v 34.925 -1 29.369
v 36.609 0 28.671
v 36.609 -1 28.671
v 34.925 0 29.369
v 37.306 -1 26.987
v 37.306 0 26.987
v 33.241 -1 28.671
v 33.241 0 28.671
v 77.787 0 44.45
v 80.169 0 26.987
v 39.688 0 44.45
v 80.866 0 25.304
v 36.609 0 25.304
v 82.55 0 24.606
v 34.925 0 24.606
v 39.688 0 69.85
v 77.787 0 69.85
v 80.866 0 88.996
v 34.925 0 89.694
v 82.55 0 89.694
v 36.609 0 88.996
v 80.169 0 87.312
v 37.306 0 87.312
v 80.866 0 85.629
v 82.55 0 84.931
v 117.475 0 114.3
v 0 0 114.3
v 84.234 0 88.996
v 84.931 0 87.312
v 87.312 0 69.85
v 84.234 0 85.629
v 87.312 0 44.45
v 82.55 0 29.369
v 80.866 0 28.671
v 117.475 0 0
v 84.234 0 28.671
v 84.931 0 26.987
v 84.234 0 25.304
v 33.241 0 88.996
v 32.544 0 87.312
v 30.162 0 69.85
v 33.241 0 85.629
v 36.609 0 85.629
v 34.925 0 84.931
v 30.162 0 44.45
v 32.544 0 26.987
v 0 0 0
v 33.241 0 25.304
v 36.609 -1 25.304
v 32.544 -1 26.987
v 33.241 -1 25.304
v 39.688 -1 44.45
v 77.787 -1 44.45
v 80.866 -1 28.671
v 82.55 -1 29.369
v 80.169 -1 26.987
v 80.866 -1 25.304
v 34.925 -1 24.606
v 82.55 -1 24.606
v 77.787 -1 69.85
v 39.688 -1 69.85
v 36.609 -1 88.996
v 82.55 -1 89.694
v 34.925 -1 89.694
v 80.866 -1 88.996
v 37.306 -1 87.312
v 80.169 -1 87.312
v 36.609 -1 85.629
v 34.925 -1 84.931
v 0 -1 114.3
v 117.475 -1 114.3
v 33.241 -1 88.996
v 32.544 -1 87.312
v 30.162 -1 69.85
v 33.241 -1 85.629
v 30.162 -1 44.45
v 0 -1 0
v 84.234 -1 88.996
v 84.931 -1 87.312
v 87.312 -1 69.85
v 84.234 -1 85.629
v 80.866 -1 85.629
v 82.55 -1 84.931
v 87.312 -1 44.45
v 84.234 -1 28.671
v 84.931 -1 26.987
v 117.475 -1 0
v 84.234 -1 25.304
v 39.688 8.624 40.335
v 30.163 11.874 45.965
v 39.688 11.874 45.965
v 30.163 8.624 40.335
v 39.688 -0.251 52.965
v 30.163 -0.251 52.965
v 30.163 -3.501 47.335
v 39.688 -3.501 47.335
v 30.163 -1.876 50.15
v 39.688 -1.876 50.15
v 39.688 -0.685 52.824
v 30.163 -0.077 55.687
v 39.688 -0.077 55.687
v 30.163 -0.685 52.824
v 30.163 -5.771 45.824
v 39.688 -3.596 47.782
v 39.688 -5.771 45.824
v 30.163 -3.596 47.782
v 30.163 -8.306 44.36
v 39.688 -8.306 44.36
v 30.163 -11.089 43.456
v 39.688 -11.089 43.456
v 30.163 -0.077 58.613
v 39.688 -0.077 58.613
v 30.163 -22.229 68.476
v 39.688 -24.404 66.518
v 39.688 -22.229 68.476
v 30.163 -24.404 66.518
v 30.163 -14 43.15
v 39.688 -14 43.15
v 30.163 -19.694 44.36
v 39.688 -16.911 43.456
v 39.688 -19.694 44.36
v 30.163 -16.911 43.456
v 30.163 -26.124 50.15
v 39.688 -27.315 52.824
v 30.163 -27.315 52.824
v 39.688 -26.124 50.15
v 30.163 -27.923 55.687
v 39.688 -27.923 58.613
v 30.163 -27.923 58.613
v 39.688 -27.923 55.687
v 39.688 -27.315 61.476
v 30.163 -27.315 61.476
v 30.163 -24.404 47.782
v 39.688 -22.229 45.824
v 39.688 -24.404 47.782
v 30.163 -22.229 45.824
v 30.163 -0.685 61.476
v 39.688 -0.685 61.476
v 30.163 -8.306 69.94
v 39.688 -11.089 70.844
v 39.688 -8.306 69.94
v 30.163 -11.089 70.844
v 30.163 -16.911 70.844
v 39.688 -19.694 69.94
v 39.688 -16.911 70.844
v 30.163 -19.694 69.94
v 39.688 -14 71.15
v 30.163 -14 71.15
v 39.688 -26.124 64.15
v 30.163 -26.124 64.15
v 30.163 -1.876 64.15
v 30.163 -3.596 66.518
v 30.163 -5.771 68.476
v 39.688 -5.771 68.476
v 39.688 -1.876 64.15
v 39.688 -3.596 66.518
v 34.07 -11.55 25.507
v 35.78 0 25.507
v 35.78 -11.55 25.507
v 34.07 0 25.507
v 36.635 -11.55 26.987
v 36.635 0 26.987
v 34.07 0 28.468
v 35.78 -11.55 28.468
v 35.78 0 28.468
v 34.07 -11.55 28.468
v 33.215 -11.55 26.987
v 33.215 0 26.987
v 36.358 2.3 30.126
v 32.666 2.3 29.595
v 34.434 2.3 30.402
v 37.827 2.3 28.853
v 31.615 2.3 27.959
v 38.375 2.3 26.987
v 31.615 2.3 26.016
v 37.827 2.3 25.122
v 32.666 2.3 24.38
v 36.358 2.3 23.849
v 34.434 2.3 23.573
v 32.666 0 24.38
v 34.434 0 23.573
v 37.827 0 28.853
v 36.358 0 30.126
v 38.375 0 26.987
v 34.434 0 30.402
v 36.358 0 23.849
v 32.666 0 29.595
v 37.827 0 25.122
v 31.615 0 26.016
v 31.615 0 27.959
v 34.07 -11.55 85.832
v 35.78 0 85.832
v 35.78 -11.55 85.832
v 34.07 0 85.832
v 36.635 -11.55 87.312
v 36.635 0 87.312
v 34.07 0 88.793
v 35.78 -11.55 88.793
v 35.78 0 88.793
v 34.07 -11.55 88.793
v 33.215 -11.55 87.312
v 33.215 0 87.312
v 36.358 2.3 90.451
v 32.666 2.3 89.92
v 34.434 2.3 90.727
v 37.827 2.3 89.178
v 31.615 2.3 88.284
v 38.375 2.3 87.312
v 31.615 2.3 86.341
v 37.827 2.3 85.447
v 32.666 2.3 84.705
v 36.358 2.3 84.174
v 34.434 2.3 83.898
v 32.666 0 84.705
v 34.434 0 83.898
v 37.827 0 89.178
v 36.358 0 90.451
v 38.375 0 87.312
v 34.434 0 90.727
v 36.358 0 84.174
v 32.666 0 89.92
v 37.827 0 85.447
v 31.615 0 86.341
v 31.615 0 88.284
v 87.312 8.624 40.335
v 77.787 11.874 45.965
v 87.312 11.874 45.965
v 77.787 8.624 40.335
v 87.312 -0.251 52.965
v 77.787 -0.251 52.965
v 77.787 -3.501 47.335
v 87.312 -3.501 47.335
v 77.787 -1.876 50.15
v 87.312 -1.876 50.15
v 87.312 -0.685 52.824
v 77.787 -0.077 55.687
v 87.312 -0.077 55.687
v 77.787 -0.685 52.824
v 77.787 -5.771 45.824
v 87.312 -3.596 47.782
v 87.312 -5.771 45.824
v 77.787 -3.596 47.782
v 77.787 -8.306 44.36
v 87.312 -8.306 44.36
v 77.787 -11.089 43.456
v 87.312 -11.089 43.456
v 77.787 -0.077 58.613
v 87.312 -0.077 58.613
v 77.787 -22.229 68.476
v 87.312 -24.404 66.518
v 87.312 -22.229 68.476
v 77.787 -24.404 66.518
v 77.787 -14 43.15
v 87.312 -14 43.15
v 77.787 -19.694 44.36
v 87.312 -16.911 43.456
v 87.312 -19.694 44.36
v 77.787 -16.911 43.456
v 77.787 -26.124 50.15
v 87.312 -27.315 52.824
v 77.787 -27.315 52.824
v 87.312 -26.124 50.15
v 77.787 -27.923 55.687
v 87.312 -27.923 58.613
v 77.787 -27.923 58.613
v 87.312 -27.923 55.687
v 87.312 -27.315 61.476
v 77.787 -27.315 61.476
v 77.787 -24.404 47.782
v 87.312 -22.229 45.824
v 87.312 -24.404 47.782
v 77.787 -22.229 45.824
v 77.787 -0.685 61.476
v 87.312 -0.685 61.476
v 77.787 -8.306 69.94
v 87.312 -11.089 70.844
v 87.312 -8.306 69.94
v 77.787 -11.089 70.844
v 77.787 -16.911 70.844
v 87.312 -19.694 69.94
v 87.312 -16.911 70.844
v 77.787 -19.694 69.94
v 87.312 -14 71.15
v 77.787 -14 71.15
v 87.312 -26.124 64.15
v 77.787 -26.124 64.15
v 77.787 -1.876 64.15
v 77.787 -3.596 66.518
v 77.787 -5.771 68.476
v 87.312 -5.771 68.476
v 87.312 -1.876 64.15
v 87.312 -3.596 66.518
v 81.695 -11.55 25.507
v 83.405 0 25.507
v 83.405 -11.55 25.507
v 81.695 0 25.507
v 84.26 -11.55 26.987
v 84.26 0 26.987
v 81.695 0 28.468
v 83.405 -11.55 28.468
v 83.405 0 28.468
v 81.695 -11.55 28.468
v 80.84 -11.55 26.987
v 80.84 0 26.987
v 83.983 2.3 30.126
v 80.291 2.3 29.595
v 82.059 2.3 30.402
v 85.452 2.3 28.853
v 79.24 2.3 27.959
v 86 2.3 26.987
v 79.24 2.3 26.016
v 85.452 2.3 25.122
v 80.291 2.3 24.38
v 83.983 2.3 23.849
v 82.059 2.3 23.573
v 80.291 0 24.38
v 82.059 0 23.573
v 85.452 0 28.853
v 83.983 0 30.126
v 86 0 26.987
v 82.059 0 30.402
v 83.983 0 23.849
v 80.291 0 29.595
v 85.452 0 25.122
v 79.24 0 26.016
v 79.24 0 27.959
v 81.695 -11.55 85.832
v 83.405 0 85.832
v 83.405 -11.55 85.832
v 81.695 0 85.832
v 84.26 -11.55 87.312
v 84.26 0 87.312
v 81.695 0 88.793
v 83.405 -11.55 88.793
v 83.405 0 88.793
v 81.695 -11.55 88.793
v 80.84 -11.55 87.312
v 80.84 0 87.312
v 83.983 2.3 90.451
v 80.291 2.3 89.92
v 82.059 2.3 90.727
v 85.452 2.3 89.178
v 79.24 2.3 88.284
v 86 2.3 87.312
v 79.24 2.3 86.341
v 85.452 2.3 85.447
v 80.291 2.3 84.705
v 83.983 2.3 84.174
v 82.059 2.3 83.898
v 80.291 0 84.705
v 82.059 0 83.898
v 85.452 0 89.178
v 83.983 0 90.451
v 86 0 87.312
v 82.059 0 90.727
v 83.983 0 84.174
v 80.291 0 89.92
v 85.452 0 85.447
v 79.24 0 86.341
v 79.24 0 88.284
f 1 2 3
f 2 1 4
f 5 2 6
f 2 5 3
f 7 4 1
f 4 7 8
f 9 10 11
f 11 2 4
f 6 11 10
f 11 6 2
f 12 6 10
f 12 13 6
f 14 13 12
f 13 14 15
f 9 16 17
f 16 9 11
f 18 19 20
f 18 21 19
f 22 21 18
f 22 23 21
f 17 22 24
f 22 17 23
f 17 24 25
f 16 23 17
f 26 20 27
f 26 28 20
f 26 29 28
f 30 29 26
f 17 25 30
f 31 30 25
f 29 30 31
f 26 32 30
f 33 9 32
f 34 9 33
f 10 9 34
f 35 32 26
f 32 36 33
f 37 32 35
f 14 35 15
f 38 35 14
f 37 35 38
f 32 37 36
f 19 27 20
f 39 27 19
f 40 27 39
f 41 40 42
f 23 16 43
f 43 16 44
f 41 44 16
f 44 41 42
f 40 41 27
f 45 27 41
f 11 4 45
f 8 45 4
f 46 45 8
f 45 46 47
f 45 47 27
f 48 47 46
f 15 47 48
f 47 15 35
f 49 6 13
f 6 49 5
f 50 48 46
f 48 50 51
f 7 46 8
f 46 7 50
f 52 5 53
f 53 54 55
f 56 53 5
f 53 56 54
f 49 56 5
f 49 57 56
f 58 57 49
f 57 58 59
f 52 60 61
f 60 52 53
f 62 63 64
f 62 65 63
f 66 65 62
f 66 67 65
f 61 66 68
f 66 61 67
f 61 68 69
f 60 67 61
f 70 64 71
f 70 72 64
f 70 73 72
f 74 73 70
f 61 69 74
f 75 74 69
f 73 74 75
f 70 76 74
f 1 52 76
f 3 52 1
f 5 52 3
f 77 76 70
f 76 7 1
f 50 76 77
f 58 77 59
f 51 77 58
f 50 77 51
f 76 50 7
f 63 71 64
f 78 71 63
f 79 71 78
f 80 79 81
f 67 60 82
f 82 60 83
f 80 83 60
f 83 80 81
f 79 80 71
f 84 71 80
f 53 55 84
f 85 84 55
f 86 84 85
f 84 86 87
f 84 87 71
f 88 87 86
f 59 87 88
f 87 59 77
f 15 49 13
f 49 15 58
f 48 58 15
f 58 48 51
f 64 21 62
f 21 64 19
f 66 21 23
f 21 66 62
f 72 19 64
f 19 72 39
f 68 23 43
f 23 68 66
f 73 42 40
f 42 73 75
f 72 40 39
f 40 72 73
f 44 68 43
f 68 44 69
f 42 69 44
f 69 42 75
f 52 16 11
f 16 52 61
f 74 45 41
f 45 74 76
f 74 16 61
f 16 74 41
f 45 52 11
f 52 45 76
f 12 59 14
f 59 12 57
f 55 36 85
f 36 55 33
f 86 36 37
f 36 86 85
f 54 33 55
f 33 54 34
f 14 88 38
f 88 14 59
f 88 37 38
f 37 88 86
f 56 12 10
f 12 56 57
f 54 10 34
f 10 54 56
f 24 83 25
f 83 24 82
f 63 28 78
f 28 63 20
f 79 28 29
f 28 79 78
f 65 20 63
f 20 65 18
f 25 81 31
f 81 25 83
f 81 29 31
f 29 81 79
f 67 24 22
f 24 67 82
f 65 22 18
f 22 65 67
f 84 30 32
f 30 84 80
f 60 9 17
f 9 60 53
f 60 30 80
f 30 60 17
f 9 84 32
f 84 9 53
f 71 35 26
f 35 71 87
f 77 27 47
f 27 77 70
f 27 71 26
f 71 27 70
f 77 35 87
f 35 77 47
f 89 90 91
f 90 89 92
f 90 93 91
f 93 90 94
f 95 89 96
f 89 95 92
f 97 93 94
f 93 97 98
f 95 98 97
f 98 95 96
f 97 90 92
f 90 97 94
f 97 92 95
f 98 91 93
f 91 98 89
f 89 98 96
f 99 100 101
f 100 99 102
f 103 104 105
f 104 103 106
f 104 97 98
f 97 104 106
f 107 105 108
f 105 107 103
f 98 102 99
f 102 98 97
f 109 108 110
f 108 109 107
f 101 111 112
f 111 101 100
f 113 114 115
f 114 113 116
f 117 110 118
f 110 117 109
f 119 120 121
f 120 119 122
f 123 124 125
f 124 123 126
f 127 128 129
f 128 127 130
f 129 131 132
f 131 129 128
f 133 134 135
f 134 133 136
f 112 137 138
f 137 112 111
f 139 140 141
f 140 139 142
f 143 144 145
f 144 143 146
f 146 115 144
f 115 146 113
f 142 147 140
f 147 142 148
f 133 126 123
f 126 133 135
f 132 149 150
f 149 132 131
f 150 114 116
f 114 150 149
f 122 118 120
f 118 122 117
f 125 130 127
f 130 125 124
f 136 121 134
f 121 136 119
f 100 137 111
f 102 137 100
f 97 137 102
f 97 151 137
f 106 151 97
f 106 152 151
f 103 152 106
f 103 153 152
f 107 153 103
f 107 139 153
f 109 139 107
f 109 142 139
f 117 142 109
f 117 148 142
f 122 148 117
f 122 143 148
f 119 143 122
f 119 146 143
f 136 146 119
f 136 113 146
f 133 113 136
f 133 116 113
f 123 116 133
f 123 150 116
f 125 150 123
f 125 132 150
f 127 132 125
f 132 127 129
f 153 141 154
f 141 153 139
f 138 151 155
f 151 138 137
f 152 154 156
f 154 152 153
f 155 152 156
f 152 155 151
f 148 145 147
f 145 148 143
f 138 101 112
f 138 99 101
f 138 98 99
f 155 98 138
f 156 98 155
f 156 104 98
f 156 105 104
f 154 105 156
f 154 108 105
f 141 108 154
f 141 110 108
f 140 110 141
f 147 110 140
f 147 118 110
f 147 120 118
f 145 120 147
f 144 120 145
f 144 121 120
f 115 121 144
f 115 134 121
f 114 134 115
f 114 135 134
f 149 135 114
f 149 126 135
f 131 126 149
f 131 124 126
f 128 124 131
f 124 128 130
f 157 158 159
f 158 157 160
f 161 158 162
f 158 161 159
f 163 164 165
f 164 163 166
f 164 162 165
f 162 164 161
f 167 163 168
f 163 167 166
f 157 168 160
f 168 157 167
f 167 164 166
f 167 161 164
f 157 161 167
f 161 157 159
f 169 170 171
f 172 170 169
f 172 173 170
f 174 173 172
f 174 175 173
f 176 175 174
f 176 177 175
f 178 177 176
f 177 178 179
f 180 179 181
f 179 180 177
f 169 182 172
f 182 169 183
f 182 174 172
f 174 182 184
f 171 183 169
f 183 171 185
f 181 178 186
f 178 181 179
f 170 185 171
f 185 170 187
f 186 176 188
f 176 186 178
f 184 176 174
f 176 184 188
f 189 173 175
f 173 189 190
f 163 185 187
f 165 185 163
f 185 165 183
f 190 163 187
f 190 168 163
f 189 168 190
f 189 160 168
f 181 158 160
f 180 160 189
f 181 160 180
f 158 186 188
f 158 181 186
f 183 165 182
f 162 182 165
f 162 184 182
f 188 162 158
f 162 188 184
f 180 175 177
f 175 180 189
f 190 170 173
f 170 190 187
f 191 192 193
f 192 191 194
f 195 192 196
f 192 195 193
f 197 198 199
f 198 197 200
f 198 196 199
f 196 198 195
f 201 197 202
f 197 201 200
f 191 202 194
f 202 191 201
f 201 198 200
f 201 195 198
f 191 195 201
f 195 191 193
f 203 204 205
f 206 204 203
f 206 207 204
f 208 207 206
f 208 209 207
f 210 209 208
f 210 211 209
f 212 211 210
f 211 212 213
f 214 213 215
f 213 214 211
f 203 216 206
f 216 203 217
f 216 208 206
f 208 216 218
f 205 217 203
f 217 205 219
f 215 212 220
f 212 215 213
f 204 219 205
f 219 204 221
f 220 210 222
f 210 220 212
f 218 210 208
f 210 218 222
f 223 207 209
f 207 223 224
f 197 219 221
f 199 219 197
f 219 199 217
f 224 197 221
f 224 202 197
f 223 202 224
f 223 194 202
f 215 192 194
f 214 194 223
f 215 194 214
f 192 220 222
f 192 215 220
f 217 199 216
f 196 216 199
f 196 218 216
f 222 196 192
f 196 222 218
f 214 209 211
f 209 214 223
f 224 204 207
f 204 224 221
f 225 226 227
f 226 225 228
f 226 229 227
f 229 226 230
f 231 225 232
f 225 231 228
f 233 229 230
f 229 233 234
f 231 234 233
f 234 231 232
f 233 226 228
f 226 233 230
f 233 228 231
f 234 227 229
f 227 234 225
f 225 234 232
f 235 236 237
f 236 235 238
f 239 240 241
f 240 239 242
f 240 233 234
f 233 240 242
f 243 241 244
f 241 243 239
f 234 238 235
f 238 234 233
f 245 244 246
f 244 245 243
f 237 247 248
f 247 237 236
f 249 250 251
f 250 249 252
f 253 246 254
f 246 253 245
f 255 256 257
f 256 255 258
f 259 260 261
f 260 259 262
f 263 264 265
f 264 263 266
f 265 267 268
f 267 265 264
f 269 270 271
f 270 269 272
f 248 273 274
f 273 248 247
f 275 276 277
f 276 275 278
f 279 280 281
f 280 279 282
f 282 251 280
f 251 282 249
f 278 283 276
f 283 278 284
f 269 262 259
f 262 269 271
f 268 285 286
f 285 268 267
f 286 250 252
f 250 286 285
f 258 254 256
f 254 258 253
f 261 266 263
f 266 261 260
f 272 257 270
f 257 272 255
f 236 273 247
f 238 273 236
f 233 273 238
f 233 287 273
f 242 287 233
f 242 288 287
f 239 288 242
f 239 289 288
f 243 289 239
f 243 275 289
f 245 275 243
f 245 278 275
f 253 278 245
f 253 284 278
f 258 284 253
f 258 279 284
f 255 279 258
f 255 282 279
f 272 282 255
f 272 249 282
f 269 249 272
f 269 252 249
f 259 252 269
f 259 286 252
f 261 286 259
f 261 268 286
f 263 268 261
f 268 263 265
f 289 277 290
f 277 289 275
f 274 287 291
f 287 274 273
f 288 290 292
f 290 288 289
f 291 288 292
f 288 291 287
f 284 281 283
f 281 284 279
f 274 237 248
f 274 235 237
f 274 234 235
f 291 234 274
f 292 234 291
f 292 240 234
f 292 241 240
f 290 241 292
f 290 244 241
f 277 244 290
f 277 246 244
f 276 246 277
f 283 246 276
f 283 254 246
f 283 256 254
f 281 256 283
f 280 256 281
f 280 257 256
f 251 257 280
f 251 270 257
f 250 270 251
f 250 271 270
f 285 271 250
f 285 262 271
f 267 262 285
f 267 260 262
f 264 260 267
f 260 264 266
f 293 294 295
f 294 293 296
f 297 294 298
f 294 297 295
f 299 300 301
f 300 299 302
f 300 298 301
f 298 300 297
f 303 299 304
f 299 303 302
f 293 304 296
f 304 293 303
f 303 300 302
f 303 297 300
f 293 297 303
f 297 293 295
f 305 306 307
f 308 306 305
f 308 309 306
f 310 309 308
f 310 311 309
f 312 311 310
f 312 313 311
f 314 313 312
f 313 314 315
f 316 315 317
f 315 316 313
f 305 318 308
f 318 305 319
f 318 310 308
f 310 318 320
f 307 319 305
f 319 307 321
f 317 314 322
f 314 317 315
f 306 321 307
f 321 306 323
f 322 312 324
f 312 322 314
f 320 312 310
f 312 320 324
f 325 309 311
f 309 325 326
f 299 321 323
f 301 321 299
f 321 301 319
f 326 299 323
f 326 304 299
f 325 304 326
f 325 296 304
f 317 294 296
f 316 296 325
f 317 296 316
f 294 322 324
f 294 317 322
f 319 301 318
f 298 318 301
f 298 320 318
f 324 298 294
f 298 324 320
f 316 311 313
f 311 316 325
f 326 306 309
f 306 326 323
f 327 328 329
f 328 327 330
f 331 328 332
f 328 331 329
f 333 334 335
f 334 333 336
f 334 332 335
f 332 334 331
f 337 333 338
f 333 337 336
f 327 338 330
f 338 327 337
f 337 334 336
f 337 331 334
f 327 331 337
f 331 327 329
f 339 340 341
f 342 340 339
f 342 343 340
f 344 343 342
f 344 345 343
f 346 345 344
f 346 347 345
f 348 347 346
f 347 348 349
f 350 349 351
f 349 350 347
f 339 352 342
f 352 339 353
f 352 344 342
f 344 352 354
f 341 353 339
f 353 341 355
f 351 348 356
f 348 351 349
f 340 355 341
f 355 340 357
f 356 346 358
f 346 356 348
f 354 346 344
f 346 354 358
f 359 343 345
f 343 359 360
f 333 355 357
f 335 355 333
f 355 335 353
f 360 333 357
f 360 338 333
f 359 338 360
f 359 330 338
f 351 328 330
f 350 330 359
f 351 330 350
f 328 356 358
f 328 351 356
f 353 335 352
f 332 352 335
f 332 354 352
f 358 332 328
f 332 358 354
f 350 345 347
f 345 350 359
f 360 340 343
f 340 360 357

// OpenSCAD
// file: ../parameters/lightswitch_parameters.scad
// This is a light switch plate parameterized on how many light switches the plate has.
numberOfSwitches = 2;

// These parameters shouldn't change, but are the measurements in inches of the various lengths on a standard light switch.
plateToEdgeSwitchInches = 1.375;
switchToSwitchInches = 1.875;
switchHeightInches = 1;
switchWidthInches = 3/8;
verticalScrewDistanceInches = 2.375;
plateHeightInches = 4.5;
screwDiameterInches = 3/16;

// These are the parameters converted into the metric units used by OpenSCAD
inchesToMm = 25.4;
plateToEdgeSwitch = plateToEdgeSwitchInches * inchesToMm;
switchToSwitch = switchToSwitchInches * inchesToMm;
switchHeight = switchHeightInches * inchesToMm;
switchWidth = switchWidthInches * inchesToMm;
verticalScrewDistance = verticalScrewDistanceInches * inchesToMm;
plateHeight = plateHeightInches * inchesToMm;
screwDiameter = screwDiameterInches * inchesToMm;

// Undefined parameters that I'm guessing at
plateDepth = 1;

// These are the rough millimeter measurements of a light switch.
switchLength = 6.5;
switchDepth = 14;

// These are the rough dimensions of a light switch screw.
screwLength = 13.85;
screwHeadRadius = 6.9/2;
screwHeadHeight = 2.3;
screwBodyRadius = 3.42/2;

switchRotationMultiplier = 30; // This is a multiplier used to get the actual angle of the switches in the switch assembly. It is multiplied by the -1 to 1 angle parameter of the light switch module.

screwVerticalDistanceFromEdge = (plateHeight-verticalScrewDistance)/2;
// file: ../modules/lightswitch_screw.scad
include <../parameters/lightswitch_parameters.scad>

module lightswitch_screw(screwLength = screwLength, screwHeadRadius = screwHeadRadius, screwHeadHeight = screwHeadHeight, screwBodyRadius = screwBodyRadius){
    union(){
        cylinder(h=screwLength, r=screwBodyRadius);
        cylinder(h=screwHeadHeight, r=screwHeadRadius);
    }
}

lightswitch_screw(numberOfSwitches, plateToEdgeSwitch, switchToSwitch, switchHeight, switchWidth, verticalScrewDistance, plateHeight, plateDepth, screwDiameter);
// file: ../modules/lightswitch_plate.scad
include <../parameters/lightswitch_parameters.scad>

module switchPlate(numberOfSwitches=numberOfSwitches, plateToEdgeSwitch=plateToEdgeSwitch, switchToSwitch=switchToSwitch, switchHeight=switchHeight, switchWidth=switchWidth, verticalScrewDistance=verticalScrewDistance, plateHeight=plateHeight, plateDepth=plateDepth, screwDiameter=screwDiameter, screwVerticalDistanceFromEdge=screwVerticalDistanceFromEdge){

    rotate([90, 0, 0]){
        difference(){
            cube([plateToEdgeSwitch*2+(switchToSwitch*(numberOfSwitches-1)), plateHeight, plateDepth]);
            for(index = [0:1:numberOfSwitches-1]){
                // screw hole top
                translate([plateToEdgeSwitch + (index * switchToSwitch), screwVerticalDistanceFromEdge, 0]){
                    cylinder(r1=screwDiameter/2, r2=screwDiameter/2, h=plateDepth);
                }
                // screw hole bottom
                translate([plateToEdgeSwitch + (index * switchToSwitch), plateHeight-screwVerticalDistanceFromEdge, 0]){
                    cylinder(r1=screwDiameter/2, r2=screwDiameter/2, h=plateDepth);
                }
                // switch hole
                translate([plateToEdgeSwitch + (index * switchToSwitch) - switchWidth/2, plateHeight/2 - switchHeight/2, 0]){
                    cube([switchWidth, switchHeight, plateDepth]);
                }
            }
        }
    }
}

switchPlate(numberOfSwitches, plateToEdgeSwitch, switchToSwitch, switchHeight, switchWidth, verticalScrewDistance, plateHeight, plateDepth, screwDiameter);
// file: ../modules/lightswitch.scad
include <../parameters/lightswitch_parameters.scad>

module switch(switchLength=switchLength, switchWidth=switchWidth, switchDepth=switchDepth){
    cylinderRadius = switchDepth;
    translate([cylinderRadius, -switchWidth/2, -switchLength/2]){
        union(){
            cube([switchDepth, switchWidth, switchLength]);
            translate([-cylinderRadius, 0, switchLength/2]){
                rotate([270, 0, 0]){
                    cylinder(r1=cylinderRadius, r2=cylinderRadius, h=switchWidth);
                }
            }
        }
    }
}

// This animates the switch.
if($t < 0.5){
    rotate([0, -40 + $t*(160), 0])
    switch(switchLength, switchWidth, switchDepth);
}else{
    rotate([0, 40 - ($t-0.5)*(160), 0])
    switch(switchLength, switchWidth, switchDepth);
}
// main file
// The "use" keyword means only functions and modules are taken.
use <../modules/lightswitch.scad>
use <../modules/lightswitch_plate.scad>
use <../modules/lightswitch_screw.scad>
// The "include" keyword means all variables are taken as though the code was inserted in this file.
include <../parameters/lightswitch_parameters.scad>

// The list of switchRotations is a list of numbers from -1 to 1 that controls the rotation of each switch in the switch model
module switchFullModel(switchRotations = [for (i = [0:numberOfSwitches-1]) 0], screwOffset = 0){
    switchPlate();
    for(index=[0:1:numberOfSwitches-1]){
        translate([plateToEdgeSwitch + (index*switchToSwitch), -switchDepth, plateHeight/2]){
            rotate([0, switchRotations[index]*switchRotationMultiplier, 90]){
                    switch();
            }
        }

        translate([plateToEdgeSwitch + (index*switchToSwitch), screwHeadHeight + screwOffset, screwVerticalDistanceFromEdge]){
            rotate([90, 0, 0]){
                lightswitch_screw();
            }
        }
        translate([plateToEdgeSwitch + (index*switchToSwitch), screwHeadHeight + screwOffset, plateHeight-screwVerticalDistanceFromEdge]){
            rotate([90, 0, 0]){
                lightswitch_screw();
            }
        }
    }
}

// This helps to make a smooth animation for the switch full model.
switchPosition = 0;
if ($t < 0.5){
    switchPosition = 1-$t*4;
    switchFullModel(switchRotations = [for (i=[0:numberOfSwitches-1]) switchPosition]);
} else {
    switchPosition = -1+($t-.5)*4;
    switchFullModel(switchRotations = [for (i=[0:numberOfSwitches-1]) switchPosition]);
}
